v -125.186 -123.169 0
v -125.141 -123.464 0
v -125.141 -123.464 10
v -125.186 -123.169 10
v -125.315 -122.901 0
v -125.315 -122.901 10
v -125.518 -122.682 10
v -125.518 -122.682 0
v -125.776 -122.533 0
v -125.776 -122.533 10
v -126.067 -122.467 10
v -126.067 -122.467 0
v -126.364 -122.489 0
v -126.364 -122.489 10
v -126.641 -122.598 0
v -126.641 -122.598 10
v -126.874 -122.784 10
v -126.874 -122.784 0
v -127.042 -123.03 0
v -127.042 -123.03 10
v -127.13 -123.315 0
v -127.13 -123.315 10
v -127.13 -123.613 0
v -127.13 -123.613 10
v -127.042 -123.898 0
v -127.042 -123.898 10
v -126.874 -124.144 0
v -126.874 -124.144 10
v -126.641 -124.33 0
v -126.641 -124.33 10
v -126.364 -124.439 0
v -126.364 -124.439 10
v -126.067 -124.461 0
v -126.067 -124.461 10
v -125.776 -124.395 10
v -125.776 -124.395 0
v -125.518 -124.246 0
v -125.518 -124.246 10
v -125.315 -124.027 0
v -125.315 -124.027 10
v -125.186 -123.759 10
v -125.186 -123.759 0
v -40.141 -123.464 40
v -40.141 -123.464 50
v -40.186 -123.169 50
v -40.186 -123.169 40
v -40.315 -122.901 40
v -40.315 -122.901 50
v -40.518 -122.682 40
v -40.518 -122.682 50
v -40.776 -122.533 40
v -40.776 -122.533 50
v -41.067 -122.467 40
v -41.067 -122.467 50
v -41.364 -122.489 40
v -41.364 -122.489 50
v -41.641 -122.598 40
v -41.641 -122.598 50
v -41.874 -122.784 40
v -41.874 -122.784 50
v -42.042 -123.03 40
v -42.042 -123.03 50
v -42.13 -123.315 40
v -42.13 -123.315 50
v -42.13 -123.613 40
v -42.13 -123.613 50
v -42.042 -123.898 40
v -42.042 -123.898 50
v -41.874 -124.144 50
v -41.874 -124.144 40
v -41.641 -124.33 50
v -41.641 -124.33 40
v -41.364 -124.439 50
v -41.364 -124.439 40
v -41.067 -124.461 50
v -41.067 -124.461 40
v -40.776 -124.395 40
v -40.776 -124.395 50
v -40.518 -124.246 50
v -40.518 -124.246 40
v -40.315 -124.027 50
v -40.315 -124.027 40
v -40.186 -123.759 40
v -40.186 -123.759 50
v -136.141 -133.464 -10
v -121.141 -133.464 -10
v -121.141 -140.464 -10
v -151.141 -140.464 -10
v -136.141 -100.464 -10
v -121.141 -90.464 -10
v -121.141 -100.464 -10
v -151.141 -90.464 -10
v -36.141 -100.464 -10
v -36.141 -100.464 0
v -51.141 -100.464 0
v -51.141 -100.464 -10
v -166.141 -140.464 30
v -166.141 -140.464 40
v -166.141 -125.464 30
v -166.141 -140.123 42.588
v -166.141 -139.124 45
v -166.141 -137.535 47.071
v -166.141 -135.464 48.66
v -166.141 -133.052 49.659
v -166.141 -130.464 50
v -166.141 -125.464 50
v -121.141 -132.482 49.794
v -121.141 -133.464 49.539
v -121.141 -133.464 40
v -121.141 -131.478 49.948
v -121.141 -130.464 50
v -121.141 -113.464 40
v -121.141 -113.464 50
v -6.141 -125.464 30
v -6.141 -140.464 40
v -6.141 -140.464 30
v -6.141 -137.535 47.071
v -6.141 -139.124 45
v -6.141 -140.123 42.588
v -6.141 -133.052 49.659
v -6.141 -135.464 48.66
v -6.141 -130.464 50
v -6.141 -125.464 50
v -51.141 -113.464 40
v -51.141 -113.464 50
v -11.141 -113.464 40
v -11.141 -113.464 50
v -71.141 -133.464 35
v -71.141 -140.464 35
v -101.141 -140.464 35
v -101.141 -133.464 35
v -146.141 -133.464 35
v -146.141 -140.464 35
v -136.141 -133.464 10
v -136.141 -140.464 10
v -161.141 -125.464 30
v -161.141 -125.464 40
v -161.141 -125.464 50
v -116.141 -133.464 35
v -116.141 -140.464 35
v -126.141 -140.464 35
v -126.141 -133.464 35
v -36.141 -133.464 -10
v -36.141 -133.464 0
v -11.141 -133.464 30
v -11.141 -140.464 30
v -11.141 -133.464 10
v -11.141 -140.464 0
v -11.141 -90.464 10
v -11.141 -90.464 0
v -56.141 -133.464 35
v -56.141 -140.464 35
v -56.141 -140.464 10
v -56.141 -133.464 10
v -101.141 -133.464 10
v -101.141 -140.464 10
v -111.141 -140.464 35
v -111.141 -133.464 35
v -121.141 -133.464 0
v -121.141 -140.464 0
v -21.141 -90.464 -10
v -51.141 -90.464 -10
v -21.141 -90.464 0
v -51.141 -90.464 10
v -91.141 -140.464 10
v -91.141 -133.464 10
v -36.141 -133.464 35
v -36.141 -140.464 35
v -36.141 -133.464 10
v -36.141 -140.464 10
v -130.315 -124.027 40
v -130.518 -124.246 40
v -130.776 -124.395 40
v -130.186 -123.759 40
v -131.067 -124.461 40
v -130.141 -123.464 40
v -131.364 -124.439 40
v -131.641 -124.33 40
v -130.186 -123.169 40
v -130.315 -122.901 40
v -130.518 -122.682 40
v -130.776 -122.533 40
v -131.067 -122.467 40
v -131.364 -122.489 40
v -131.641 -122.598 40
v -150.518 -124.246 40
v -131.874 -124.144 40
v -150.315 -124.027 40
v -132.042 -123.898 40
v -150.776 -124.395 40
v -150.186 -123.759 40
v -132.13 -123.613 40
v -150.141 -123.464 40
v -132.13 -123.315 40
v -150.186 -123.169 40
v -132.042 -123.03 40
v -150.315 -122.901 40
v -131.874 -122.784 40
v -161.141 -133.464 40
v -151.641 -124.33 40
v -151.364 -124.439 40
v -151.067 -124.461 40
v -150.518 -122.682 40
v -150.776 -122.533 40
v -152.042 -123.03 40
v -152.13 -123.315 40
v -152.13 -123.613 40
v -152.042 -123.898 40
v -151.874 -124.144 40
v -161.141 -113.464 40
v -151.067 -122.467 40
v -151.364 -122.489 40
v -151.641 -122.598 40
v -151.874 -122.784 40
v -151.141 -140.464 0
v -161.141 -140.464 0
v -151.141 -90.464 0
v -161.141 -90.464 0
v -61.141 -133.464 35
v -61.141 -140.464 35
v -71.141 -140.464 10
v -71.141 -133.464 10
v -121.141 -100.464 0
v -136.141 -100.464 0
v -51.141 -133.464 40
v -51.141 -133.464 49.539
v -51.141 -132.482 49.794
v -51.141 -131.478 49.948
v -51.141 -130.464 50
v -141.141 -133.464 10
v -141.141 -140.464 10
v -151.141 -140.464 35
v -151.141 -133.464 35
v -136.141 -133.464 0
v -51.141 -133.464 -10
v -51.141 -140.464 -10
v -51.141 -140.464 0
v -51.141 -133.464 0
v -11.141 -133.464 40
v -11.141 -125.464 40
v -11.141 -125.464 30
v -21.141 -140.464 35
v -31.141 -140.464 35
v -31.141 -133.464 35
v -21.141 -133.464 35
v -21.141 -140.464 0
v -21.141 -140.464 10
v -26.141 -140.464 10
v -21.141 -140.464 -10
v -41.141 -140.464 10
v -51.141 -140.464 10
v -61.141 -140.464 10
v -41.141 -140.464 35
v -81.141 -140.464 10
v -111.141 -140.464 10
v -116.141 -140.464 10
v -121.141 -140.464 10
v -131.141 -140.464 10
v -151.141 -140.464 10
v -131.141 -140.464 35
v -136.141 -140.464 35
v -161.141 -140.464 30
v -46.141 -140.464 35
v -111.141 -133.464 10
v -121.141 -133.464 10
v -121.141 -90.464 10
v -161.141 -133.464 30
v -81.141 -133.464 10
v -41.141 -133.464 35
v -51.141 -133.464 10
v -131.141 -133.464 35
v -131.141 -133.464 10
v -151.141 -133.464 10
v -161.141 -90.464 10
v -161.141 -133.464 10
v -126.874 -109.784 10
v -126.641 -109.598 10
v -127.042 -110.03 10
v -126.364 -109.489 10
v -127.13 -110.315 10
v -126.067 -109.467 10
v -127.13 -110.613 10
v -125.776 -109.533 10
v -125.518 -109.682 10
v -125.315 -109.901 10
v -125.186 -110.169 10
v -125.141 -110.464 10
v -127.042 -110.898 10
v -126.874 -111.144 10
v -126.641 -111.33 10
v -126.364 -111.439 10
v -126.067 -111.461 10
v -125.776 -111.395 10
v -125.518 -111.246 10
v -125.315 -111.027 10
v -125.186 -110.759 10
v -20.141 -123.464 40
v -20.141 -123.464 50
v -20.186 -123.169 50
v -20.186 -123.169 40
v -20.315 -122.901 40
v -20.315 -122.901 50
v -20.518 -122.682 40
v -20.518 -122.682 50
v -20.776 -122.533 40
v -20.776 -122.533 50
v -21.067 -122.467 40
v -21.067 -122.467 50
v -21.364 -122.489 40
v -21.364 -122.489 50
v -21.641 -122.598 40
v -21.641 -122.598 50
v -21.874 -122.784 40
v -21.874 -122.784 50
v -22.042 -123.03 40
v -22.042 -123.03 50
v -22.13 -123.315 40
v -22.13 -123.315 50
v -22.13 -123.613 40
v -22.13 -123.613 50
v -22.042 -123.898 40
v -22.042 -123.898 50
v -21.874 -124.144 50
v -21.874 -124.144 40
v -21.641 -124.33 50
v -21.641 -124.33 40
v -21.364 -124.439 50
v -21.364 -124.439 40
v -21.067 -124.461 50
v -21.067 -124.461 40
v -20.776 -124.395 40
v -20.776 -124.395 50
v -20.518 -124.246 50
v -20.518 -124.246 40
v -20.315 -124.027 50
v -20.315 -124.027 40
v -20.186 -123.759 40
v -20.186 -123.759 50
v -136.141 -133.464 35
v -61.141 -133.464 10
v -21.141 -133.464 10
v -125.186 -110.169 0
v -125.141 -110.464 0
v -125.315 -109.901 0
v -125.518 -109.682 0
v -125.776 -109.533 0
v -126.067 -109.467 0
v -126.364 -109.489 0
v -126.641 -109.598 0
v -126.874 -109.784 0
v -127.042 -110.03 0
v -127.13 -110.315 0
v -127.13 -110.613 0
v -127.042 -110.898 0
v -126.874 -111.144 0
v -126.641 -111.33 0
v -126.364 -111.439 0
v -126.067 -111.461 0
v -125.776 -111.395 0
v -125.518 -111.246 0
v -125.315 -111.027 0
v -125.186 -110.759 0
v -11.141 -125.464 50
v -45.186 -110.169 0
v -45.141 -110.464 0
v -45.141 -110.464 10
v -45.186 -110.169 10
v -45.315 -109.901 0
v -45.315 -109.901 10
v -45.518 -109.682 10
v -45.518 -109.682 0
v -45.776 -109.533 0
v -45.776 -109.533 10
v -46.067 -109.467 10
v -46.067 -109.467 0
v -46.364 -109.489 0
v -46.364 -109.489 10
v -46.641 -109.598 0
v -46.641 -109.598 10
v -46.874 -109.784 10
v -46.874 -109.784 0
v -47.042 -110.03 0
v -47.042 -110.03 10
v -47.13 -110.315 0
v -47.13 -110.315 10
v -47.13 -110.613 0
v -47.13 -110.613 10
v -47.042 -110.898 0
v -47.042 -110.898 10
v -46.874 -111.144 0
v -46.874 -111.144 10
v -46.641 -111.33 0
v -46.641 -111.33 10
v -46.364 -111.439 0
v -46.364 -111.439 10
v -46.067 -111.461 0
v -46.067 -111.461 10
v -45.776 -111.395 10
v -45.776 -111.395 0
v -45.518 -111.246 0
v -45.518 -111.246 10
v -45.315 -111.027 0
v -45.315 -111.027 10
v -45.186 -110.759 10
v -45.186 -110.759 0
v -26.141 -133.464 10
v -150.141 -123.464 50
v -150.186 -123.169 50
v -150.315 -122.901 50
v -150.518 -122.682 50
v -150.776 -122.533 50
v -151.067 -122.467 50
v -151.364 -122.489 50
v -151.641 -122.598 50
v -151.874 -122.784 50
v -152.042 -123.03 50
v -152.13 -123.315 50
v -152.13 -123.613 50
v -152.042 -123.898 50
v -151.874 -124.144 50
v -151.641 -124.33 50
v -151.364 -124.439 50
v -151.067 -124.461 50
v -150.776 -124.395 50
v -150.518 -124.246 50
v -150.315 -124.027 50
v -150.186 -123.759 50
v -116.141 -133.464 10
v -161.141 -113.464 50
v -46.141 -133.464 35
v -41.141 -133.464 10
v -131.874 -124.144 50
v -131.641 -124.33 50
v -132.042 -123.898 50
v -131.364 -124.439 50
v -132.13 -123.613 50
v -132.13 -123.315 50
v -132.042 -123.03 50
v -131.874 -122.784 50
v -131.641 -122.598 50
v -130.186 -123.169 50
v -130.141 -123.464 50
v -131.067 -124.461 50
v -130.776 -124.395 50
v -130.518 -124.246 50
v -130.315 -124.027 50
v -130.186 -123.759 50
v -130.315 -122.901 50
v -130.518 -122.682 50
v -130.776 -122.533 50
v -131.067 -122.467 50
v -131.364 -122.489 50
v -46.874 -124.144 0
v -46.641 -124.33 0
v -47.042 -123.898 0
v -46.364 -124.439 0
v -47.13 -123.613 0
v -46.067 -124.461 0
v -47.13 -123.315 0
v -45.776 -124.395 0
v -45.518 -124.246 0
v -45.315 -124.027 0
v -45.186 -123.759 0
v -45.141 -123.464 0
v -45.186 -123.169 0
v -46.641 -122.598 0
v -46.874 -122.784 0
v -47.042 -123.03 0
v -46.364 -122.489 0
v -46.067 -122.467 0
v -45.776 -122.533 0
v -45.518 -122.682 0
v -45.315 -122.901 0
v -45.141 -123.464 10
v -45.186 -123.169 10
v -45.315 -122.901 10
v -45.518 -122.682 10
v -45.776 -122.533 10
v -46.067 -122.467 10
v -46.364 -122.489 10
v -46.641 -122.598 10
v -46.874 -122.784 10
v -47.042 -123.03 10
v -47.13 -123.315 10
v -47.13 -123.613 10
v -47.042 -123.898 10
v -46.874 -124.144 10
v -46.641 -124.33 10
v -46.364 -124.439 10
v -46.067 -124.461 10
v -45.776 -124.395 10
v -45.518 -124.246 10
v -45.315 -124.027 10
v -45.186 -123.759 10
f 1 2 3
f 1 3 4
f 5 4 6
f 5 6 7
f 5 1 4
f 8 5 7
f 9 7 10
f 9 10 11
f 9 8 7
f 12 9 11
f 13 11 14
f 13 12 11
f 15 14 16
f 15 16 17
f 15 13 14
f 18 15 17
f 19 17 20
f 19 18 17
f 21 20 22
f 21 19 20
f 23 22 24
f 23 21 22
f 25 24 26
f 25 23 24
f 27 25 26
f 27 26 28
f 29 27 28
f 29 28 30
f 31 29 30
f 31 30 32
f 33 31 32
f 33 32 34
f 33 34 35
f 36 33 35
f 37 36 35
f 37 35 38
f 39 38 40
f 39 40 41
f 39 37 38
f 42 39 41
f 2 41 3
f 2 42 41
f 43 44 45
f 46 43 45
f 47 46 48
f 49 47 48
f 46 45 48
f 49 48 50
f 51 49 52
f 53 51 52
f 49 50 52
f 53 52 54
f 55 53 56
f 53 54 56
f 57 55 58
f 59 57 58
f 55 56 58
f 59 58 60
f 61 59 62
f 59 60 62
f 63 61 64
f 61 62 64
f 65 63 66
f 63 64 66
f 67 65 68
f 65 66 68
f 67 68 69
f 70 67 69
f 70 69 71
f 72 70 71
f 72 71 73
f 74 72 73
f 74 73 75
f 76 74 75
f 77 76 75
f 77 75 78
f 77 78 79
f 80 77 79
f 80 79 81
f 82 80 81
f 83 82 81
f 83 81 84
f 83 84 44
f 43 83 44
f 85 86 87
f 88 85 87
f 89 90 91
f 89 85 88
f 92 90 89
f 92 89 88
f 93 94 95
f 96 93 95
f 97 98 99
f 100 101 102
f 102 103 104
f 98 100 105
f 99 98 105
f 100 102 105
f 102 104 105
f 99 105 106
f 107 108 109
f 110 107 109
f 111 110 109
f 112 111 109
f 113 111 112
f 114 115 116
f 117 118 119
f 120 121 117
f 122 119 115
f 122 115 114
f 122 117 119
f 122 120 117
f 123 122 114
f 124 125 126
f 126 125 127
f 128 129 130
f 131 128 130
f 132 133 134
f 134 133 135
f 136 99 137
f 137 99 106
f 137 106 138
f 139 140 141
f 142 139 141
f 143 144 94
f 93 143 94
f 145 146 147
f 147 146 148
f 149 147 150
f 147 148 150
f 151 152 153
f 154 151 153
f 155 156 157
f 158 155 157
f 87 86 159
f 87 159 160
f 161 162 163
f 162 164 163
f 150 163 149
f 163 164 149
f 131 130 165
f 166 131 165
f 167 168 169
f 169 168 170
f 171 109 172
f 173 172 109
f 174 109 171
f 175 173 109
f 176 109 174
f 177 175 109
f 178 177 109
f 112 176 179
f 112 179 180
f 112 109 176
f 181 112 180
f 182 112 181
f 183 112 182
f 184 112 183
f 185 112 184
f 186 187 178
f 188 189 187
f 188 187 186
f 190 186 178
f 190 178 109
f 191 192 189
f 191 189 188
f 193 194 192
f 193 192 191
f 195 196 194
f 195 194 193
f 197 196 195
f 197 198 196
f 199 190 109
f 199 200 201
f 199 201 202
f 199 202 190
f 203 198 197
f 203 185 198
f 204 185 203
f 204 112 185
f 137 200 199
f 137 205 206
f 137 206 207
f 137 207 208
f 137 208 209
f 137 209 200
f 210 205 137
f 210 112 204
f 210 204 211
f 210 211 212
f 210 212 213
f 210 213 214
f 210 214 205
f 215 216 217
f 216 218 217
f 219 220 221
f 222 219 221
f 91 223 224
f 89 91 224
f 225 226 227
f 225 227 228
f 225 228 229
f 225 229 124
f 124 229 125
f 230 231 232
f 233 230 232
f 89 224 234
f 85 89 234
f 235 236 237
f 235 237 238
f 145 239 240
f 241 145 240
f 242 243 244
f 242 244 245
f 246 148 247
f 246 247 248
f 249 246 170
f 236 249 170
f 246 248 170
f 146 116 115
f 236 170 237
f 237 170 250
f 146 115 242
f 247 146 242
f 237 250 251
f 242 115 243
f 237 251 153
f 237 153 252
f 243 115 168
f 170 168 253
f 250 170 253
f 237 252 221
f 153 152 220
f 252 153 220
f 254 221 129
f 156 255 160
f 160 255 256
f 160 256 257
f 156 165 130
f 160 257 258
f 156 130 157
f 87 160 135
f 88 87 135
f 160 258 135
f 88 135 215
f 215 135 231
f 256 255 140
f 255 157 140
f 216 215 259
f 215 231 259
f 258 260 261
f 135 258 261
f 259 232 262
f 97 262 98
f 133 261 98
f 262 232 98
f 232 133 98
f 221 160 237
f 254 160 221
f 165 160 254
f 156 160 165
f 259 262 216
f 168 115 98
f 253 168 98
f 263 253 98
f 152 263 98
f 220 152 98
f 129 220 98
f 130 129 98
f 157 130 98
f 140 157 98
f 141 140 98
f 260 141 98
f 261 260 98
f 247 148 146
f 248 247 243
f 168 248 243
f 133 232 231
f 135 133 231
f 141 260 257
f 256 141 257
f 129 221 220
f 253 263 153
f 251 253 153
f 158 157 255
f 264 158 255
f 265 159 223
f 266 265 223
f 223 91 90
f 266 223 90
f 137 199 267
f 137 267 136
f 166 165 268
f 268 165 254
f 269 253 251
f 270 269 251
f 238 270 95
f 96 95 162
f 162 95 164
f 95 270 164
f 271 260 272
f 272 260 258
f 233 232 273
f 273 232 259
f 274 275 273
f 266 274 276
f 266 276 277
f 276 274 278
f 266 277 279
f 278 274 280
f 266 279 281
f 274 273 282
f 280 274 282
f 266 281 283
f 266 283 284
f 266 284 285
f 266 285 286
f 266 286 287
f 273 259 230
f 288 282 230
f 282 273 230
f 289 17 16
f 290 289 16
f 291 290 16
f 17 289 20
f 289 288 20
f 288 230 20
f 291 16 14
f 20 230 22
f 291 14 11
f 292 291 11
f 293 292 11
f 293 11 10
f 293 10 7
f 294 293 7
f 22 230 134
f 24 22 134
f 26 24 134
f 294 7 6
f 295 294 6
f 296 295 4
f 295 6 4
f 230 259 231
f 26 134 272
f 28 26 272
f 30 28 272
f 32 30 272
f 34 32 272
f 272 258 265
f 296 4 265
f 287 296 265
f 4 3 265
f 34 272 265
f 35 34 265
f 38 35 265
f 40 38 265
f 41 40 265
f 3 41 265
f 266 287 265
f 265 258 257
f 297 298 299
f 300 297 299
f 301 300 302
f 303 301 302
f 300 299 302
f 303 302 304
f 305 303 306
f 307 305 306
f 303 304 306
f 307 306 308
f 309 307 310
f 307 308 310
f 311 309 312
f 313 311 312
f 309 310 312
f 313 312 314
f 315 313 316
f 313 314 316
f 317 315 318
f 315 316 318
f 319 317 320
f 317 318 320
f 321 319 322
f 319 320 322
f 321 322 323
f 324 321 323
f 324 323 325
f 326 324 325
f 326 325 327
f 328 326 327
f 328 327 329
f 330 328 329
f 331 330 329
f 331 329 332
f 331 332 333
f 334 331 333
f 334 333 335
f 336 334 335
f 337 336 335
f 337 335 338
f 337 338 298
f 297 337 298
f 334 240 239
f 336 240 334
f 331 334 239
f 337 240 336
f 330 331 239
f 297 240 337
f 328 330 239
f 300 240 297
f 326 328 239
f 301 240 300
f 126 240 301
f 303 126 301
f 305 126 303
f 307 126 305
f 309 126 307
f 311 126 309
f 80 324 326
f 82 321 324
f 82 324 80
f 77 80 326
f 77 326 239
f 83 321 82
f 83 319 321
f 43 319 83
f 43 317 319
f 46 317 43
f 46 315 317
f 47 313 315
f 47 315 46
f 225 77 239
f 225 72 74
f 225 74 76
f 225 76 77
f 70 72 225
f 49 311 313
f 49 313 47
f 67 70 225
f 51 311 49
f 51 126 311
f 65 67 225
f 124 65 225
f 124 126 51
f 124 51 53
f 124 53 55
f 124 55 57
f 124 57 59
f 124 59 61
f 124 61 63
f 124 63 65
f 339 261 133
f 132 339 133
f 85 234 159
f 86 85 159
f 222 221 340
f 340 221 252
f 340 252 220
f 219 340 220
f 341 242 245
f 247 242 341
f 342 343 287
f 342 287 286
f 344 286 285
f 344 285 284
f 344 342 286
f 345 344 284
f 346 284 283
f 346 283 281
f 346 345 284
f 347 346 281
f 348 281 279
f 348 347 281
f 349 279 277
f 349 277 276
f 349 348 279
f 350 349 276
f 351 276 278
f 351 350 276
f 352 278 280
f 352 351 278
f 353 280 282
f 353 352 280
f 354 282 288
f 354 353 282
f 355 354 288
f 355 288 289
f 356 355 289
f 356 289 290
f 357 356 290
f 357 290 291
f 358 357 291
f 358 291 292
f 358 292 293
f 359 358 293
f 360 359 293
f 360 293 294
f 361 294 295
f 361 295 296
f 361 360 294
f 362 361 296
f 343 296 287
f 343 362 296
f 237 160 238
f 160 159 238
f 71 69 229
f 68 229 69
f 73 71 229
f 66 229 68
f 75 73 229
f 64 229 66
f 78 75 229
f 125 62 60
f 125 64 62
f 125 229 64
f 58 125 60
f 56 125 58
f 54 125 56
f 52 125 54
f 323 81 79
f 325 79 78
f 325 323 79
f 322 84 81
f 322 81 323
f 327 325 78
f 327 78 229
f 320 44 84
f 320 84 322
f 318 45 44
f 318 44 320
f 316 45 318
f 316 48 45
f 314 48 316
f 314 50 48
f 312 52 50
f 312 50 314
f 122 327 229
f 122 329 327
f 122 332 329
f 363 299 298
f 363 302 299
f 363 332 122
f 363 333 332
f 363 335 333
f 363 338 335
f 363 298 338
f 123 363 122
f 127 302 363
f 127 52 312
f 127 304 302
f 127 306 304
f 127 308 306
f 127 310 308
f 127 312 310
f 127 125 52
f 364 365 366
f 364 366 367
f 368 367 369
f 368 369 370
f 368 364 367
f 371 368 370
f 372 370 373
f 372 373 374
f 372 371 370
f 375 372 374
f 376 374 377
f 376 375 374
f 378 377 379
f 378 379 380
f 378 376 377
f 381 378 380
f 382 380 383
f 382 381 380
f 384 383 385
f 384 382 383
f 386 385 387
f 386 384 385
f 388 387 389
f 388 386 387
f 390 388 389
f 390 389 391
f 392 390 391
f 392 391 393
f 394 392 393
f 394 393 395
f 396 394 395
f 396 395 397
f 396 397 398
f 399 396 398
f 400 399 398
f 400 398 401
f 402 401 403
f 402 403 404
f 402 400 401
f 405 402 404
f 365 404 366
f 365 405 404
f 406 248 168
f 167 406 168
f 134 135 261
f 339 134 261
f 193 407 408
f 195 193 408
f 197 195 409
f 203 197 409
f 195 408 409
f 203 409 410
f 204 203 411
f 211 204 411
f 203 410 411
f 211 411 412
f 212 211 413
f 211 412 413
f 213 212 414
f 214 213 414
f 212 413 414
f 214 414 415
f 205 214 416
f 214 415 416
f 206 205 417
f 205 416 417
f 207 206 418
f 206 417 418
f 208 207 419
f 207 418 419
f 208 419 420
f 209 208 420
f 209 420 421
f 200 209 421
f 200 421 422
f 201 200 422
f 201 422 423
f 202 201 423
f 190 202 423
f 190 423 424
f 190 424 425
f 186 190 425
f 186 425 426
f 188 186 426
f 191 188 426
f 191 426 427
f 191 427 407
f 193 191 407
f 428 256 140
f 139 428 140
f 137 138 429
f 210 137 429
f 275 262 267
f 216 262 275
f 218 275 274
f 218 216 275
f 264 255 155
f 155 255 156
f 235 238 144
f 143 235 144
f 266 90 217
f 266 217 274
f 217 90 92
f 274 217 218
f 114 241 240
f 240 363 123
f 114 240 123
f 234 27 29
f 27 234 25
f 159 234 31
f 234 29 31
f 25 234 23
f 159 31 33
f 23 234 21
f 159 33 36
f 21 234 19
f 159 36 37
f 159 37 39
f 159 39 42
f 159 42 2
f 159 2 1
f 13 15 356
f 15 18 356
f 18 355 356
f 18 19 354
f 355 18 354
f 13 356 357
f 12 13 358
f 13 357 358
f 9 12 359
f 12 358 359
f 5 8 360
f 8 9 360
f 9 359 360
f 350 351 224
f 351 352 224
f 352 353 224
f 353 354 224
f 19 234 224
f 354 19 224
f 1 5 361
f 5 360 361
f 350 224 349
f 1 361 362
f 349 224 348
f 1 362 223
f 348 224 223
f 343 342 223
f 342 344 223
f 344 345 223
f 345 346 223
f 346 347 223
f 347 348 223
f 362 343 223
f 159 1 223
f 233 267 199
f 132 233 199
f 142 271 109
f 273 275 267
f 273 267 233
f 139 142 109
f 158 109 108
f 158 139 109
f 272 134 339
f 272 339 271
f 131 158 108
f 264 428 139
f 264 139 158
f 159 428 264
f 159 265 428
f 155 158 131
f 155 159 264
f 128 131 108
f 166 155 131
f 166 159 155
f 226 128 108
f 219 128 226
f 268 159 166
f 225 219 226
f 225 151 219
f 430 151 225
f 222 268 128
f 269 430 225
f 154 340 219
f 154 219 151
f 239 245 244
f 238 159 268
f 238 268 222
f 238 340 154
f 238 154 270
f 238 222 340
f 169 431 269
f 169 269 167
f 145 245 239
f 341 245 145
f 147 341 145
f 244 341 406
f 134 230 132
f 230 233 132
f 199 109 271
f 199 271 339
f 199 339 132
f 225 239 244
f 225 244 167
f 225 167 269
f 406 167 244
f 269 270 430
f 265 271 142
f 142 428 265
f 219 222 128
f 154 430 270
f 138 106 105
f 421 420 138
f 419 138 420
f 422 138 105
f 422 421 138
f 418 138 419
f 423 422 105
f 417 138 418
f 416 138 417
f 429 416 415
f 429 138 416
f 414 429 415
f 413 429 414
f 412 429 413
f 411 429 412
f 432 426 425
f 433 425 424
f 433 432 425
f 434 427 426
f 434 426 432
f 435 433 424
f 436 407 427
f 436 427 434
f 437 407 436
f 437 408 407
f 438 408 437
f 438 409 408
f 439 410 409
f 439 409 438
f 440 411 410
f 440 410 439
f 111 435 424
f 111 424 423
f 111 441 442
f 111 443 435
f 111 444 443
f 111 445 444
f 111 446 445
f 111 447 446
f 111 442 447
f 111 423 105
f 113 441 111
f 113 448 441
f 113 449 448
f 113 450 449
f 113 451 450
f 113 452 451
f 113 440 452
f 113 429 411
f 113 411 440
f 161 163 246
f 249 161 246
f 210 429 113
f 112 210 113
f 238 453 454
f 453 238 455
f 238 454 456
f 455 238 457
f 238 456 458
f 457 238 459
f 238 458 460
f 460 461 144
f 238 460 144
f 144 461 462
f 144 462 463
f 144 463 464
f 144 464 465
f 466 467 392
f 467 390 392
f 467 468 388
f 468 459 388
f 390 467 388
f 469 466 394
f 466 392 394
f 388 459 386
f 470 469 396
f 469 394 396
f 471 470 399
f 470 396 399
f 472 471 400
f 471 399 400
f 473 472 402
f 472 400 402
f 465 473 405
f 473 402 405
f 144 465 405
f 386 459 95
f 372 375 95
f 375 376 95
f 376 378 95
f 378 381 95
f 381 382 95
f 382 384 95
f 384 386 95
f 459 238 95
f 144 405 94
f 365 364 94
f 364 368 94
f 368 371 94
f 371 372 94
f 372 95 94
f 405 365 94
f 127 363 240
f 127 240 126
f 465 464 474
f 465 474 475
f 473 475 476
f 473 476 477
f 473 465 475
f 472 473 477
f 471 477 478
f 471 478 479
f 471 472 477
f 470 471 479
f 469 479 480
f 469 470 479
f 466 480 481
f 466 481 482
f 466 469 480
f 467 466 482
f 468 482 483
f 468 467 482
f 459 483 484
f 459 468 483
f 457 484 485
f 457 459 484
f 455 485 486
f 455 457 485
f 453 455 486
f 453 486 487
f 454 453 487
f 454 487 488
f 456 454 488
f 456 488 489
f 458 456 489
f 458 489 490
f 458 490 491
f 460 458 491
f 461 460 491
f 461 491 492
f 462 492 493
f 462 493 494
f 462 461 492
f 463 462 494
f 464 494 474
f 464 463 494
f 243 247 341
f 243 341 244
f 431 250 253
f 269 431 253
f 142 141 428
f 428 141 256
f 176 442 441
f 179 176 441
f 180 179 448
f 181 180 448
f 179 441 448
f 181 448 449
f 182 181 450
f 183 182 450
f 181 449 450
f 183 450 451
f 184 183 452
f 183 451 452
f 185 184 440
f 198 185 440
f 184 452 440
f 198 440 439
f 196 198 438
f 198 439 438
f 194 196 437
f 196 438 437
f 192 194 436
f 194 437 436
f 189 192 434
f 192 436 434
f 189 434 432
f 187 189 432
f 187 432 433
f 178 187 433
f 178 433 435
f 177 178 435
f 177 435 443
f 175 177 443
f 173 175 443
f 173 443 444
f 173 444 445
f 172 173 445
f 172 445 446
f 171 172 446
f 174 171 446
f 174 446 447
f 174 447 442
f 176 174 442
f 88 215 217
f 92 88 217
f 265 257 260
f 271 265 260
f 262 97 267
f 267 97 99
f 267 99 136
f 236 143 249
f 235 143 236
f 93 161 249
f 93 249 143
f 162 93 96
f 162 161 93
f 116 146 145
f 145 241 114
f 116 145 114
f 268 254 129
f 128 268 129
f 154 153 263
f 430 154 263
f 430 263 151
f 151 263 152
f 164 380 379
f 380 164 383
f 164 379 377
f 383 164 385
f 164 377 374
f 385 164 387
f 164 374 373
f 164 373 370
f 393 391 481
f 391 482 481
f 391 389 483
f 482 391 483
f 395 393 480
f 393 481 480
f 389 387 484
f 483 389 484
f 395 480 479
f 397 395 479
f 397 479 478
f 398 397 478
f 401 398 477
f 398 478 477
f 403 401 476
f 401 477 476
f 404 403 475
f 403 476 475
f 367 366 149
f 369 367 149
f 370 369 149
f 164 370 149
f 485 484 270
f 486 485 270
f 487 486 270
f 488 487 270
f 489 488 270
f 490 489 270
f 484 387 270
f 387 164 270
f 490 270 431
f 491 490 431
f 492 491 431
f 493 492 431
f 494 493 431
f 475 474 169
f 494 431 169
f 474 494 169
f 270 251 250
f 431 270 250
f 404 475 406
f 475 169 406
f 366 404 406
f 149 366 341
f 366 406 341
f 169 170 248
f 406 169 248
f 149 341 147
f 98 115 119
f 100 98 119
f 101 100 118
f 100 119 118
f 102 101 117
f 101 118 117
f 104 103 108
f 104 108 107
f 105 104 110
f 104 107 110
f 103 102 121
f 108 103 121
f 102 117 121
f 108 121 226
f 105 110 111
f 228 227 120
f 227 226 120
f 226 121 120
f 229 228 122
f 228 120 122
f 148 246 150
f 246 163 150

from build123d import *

# Parameters (mm, degrees)
ESQUISSE2_W             = 15
ESQUISSE2_H             = 33
ESQUISSE2_R             = 1
ESQUISSE2_W_2           = 70
ESQUISSE2_H_2           = 7
BOSS_EXTRU_1_DEPTH      = 10
ESQUISSE3_W             = 150
ESQUISSE3_H             = 7
BOSS_EXTRU_2_DEPTH      = 40
ESQUISSE4_W             = 40
ESQUISSE4_H             = 20
ESQUISSE4_R             = 1
ESQUISSE4_W_2           = 5
ESQUISSE4_H_2           = 15
BOSS_EXTRU_3_DEPTH      = 20
ENL_V_MAT_EXTRU_1_DEPTH = 181.562942337
ESQUISSE6_W             = 40
ESQUISSE6_H             = 20
ENL_V_MAT_EXTRU_2_DEPTH = 10
CONG_1_R                = 10
BOSS_EXTRU_4_DEPTH      = 10


with BuildPart() as part:
    # Esquisse2 → Boss.-Extru.1 (new body)
    # profile 1 of 5: a face of its own
    with BuildSketch(Plane.XY):
        Polygon((-121.141434162, -90.464178298), (-161.141434162, -90.464178298), (-161.141434162, -140.464178298), (-121.141434162, -140.464178298), (-121.141434162, -133.464178298), (-136.141434162, -133.464178298), (-136.141434162, -100.464178298), (-121.141434162, -100.464178298), align=None)
    # profile 2 of 5: a face of its own
    with BuildSketch(Plane.XY):
        with Locations((-128.641434162, -116.964178298)):
            Rectangle(ESQUISSE2_W, ESQUISSE2_H)
        with Locations((-126.141434162, -123.464178298)):
            Circle(ESQUISSE2_R, mode=Mode.SUBTRACT)
        with Locations((-126.141434162, -110.464178298)):
            Circle(ESQUISSE2_R, mode=Mode.SUBTRACT)
    # profile 3 of 5: a face of its own
    with BuildSketch(Plane.XY):
        with Locations((-86.141434162, -136.964178298)):
            Rectangle(ESQUISSE2_W_2, ESQUISSE2_H_2)
    # profile 4 of 5: a face of its own
    with BuildSketch(Plane.XY):
        with Locations((-43.641434162, -116.964178298)):
            Rectangle(ESQUISSE2_W, ESQUISSE2_H)
        with Locations((-46.141434162, -123.464178298)):
            Circle(ESQUISSE2_R, mode=Mode.SUBTRACT)
        with Locations((-46.141434162, -110.464178298)):
            Circle(ESQUISSE2_R, mode=Mode.SUBTRACT)
    # profile 5 of 5: a face of its own
    with BuildSketch(Plane.XY):
        Polygon((-51.141434162, -133.464178298), (-51.141434162, -140.464178298), (-11.141434162, -140.464178298), (-11.141434162, -90.464178298), (-51.141434162, -90.464178298), (-51.141434162, -100.464178298), (-36.141434162, -100.464178298), (-36.141434162, -133.464178298), align=None)
    extrude(amount=BOSS_EXTRU_1_DEPTH)

    # Esquisse3 → Boss.-Extru.2 (add)
    with BuildSketch(Plane.XY.offset(10)):
        with Locations((-86.141434162, -136.964178298)):
            Rectangle(ESQUISSE3_W, ESQUISSE3_H)
    extrude(amount=BOSS_EXTRU_2_DEPTH)

    # Esquisse4 → Boss.-Extru.3 (add)
    # profile 1 of 4: a face of its own
    with BuildSketch(Plane.XY.offset(50)):
        with Locations((-141.141434162, -123.464178298)):
            Rectangle(ESQUISSE4_W, ESQUISSE4_H)
        with Locations((-151.141434162, -123.464178298)):
            Circle(ESQUISSE4_R, mode=Mode.SUBTRACT)
        with Locations((-131.141434162, -123.464178298)):
            Circle(ESQUISSE4_R, mode=Mode.SUBTRACT)
    # profile 2 of 4: a face of its own
    with BuildSketch(Plane.XY.offset(50)):
        with Locations((-31.141434162, -123.464178298)):
            Rectangle(ESQUISSE4_W, ESQUISSE4_H)
        with Locations((-41.141434162, -123.464178298)):
            Circle(ESQUISSE4_R, mode=Mode.SUBTRACT)
        with Locations((-21.141434162, -123.464178298)):
            Circle(ESQUISSE4_R, mode=Mode.SUBTRACT)
    # profile 3 of 4: a face of its own
    with BuildSketch(Plane.XY.offset(50)):
        with Locations((-163.641434162, -132.964178298)):
            Rectangle(ESQUISSE4_W_2, ESQUISSE4_H_2)
    # profile 4 of 4: a face of its own
    with BuildSketch(Plane.XY.offset(50)):
        with Locations((-8.641434162, -132.964178298)):
            Rectangle(ESQUISSE4_W_2, ESQUISSE4_H_2)
    extrude(amount=-BOSS_EXTRU_3_DEPTH)

    # Esquisse5 → Enlèv. mat.-Extru.1 (cut, through all)
    with BuildSketch(Plane.XZ.offset(140.464178298)):
        Polygon((-151.141434162, 35), (-151.141434162, 10), (-141.141434162, 10), align=None)
        Polygon((-146.141434162, 35), (-136.141434162, 10), (-136.141434162, 35), align=None)
        Polygon((-131.141434162, 35), (-131.141434162, 10), (-121.141434162, 10), align=None)
        Polygon((-126.141434162, 35), (-116.141434162, 10), (-116.141434162, 35), align=None)
        Polygon((-101.141434162, 35), (-91.141434162, 10), (-81.141434162, 10), (-71.141434162, 35), align=None)
        Polygon((-111.141434162, 35), (-111.141434162, 10), (-101.141434162, 10), align=None)
        Polygon((-71.141434162, 10), (-61.141434162, 10), (-61.141434162, 35), align=None)
        Polygon((-46.141434162, 35), (-56.141434162, 35), (-56.141434162, 10), align=None)
        Polygon((-41.141434162, 35), (-51.141434162, 10), (-41.141434162, 10), align=None)
        Polygon((-21.141434162, 35), (-21.141434162, 10), (-31.141434162, 35), align=None)
        Polygon((-36.141434162, 35), (-36.141434162, 10), (-26.141434162, 10), align=None)
    extrude(amount=-ENL_V_MAT_EXTRU_1_DEPTH, mode=Mode.SUBTRACT)

    # Esquisse6 → Enlèv. mat.-Extru.2 (cut)
    with BuildSketch(Plane(origin=(0, 0, 30), x_dir=(-1, 0, 0), z_dir=(0, 0, -1))):
        with Locations((31.141434162, -123.464178298)):
            Rectangle(ESQUISSE6_W, ESQUISSE6_H)
        with Locations((141.141434162, -123.464178298)):
            Rectangle(ESQUISSE6_W, ESQUISSE6_H)
    extrude(amount=-ENL_V_MAT_EXTRU_2_DEPTH, mode=Mode.SUBTRACT)

    # Congé1
    # the kernel refuses this fillet: 10 mm, written as the material it takes off along each edge
    with BuildSketch(Plane(origin=(18.858565838, -140.464178298, 50), x_dir=(0, 1, 0), z_dir=(-1, 0, 0))) as cong_1_piece_1:
        with BuildLine():
            CenterArc((CONG_1_R, CONG_1_R), CONG_1_R, 180, 90)
            Line((0, CONG_1_R), (0, 0))
            Line((0, 0), (CONG_1_R, 0))
        make_face()
    extrude(amount=210, mode=Mode.SUBTRACT)

    # Esquisse7 → Boss.-Extru.4 (add)
    with BuildSketch(Plane(origin=(0, 0, 0), x_dir=(-1, 0, 0), z_dir=(0, 0, -1))):
        Polygon((51.141434162, -100.464178298), (51.141434162, -90.464178298), (21.141434162, -90.464178298), (21.141434162, -140.464178298), (51.141434162, -140.464178298), (51.141434162, -133.464178298), (36.141434162, -133.464178298), (36.141434162, -100.464178298), align=None)
        Polygon((121.141434162, -133.464178298), (121.141434162, -140.464178298), (151.141434162, -140.464178298), (151.141434162, -90.464178298), (121.141434162, -90.464178298), (121.141434162, -100.464178298), (136.141434162, -100.464178298), (136.141434162, -133.464178298), align=None)
    extrude(amount=BOSS_EXTRU_4_DEPTH)


solid = part.part
